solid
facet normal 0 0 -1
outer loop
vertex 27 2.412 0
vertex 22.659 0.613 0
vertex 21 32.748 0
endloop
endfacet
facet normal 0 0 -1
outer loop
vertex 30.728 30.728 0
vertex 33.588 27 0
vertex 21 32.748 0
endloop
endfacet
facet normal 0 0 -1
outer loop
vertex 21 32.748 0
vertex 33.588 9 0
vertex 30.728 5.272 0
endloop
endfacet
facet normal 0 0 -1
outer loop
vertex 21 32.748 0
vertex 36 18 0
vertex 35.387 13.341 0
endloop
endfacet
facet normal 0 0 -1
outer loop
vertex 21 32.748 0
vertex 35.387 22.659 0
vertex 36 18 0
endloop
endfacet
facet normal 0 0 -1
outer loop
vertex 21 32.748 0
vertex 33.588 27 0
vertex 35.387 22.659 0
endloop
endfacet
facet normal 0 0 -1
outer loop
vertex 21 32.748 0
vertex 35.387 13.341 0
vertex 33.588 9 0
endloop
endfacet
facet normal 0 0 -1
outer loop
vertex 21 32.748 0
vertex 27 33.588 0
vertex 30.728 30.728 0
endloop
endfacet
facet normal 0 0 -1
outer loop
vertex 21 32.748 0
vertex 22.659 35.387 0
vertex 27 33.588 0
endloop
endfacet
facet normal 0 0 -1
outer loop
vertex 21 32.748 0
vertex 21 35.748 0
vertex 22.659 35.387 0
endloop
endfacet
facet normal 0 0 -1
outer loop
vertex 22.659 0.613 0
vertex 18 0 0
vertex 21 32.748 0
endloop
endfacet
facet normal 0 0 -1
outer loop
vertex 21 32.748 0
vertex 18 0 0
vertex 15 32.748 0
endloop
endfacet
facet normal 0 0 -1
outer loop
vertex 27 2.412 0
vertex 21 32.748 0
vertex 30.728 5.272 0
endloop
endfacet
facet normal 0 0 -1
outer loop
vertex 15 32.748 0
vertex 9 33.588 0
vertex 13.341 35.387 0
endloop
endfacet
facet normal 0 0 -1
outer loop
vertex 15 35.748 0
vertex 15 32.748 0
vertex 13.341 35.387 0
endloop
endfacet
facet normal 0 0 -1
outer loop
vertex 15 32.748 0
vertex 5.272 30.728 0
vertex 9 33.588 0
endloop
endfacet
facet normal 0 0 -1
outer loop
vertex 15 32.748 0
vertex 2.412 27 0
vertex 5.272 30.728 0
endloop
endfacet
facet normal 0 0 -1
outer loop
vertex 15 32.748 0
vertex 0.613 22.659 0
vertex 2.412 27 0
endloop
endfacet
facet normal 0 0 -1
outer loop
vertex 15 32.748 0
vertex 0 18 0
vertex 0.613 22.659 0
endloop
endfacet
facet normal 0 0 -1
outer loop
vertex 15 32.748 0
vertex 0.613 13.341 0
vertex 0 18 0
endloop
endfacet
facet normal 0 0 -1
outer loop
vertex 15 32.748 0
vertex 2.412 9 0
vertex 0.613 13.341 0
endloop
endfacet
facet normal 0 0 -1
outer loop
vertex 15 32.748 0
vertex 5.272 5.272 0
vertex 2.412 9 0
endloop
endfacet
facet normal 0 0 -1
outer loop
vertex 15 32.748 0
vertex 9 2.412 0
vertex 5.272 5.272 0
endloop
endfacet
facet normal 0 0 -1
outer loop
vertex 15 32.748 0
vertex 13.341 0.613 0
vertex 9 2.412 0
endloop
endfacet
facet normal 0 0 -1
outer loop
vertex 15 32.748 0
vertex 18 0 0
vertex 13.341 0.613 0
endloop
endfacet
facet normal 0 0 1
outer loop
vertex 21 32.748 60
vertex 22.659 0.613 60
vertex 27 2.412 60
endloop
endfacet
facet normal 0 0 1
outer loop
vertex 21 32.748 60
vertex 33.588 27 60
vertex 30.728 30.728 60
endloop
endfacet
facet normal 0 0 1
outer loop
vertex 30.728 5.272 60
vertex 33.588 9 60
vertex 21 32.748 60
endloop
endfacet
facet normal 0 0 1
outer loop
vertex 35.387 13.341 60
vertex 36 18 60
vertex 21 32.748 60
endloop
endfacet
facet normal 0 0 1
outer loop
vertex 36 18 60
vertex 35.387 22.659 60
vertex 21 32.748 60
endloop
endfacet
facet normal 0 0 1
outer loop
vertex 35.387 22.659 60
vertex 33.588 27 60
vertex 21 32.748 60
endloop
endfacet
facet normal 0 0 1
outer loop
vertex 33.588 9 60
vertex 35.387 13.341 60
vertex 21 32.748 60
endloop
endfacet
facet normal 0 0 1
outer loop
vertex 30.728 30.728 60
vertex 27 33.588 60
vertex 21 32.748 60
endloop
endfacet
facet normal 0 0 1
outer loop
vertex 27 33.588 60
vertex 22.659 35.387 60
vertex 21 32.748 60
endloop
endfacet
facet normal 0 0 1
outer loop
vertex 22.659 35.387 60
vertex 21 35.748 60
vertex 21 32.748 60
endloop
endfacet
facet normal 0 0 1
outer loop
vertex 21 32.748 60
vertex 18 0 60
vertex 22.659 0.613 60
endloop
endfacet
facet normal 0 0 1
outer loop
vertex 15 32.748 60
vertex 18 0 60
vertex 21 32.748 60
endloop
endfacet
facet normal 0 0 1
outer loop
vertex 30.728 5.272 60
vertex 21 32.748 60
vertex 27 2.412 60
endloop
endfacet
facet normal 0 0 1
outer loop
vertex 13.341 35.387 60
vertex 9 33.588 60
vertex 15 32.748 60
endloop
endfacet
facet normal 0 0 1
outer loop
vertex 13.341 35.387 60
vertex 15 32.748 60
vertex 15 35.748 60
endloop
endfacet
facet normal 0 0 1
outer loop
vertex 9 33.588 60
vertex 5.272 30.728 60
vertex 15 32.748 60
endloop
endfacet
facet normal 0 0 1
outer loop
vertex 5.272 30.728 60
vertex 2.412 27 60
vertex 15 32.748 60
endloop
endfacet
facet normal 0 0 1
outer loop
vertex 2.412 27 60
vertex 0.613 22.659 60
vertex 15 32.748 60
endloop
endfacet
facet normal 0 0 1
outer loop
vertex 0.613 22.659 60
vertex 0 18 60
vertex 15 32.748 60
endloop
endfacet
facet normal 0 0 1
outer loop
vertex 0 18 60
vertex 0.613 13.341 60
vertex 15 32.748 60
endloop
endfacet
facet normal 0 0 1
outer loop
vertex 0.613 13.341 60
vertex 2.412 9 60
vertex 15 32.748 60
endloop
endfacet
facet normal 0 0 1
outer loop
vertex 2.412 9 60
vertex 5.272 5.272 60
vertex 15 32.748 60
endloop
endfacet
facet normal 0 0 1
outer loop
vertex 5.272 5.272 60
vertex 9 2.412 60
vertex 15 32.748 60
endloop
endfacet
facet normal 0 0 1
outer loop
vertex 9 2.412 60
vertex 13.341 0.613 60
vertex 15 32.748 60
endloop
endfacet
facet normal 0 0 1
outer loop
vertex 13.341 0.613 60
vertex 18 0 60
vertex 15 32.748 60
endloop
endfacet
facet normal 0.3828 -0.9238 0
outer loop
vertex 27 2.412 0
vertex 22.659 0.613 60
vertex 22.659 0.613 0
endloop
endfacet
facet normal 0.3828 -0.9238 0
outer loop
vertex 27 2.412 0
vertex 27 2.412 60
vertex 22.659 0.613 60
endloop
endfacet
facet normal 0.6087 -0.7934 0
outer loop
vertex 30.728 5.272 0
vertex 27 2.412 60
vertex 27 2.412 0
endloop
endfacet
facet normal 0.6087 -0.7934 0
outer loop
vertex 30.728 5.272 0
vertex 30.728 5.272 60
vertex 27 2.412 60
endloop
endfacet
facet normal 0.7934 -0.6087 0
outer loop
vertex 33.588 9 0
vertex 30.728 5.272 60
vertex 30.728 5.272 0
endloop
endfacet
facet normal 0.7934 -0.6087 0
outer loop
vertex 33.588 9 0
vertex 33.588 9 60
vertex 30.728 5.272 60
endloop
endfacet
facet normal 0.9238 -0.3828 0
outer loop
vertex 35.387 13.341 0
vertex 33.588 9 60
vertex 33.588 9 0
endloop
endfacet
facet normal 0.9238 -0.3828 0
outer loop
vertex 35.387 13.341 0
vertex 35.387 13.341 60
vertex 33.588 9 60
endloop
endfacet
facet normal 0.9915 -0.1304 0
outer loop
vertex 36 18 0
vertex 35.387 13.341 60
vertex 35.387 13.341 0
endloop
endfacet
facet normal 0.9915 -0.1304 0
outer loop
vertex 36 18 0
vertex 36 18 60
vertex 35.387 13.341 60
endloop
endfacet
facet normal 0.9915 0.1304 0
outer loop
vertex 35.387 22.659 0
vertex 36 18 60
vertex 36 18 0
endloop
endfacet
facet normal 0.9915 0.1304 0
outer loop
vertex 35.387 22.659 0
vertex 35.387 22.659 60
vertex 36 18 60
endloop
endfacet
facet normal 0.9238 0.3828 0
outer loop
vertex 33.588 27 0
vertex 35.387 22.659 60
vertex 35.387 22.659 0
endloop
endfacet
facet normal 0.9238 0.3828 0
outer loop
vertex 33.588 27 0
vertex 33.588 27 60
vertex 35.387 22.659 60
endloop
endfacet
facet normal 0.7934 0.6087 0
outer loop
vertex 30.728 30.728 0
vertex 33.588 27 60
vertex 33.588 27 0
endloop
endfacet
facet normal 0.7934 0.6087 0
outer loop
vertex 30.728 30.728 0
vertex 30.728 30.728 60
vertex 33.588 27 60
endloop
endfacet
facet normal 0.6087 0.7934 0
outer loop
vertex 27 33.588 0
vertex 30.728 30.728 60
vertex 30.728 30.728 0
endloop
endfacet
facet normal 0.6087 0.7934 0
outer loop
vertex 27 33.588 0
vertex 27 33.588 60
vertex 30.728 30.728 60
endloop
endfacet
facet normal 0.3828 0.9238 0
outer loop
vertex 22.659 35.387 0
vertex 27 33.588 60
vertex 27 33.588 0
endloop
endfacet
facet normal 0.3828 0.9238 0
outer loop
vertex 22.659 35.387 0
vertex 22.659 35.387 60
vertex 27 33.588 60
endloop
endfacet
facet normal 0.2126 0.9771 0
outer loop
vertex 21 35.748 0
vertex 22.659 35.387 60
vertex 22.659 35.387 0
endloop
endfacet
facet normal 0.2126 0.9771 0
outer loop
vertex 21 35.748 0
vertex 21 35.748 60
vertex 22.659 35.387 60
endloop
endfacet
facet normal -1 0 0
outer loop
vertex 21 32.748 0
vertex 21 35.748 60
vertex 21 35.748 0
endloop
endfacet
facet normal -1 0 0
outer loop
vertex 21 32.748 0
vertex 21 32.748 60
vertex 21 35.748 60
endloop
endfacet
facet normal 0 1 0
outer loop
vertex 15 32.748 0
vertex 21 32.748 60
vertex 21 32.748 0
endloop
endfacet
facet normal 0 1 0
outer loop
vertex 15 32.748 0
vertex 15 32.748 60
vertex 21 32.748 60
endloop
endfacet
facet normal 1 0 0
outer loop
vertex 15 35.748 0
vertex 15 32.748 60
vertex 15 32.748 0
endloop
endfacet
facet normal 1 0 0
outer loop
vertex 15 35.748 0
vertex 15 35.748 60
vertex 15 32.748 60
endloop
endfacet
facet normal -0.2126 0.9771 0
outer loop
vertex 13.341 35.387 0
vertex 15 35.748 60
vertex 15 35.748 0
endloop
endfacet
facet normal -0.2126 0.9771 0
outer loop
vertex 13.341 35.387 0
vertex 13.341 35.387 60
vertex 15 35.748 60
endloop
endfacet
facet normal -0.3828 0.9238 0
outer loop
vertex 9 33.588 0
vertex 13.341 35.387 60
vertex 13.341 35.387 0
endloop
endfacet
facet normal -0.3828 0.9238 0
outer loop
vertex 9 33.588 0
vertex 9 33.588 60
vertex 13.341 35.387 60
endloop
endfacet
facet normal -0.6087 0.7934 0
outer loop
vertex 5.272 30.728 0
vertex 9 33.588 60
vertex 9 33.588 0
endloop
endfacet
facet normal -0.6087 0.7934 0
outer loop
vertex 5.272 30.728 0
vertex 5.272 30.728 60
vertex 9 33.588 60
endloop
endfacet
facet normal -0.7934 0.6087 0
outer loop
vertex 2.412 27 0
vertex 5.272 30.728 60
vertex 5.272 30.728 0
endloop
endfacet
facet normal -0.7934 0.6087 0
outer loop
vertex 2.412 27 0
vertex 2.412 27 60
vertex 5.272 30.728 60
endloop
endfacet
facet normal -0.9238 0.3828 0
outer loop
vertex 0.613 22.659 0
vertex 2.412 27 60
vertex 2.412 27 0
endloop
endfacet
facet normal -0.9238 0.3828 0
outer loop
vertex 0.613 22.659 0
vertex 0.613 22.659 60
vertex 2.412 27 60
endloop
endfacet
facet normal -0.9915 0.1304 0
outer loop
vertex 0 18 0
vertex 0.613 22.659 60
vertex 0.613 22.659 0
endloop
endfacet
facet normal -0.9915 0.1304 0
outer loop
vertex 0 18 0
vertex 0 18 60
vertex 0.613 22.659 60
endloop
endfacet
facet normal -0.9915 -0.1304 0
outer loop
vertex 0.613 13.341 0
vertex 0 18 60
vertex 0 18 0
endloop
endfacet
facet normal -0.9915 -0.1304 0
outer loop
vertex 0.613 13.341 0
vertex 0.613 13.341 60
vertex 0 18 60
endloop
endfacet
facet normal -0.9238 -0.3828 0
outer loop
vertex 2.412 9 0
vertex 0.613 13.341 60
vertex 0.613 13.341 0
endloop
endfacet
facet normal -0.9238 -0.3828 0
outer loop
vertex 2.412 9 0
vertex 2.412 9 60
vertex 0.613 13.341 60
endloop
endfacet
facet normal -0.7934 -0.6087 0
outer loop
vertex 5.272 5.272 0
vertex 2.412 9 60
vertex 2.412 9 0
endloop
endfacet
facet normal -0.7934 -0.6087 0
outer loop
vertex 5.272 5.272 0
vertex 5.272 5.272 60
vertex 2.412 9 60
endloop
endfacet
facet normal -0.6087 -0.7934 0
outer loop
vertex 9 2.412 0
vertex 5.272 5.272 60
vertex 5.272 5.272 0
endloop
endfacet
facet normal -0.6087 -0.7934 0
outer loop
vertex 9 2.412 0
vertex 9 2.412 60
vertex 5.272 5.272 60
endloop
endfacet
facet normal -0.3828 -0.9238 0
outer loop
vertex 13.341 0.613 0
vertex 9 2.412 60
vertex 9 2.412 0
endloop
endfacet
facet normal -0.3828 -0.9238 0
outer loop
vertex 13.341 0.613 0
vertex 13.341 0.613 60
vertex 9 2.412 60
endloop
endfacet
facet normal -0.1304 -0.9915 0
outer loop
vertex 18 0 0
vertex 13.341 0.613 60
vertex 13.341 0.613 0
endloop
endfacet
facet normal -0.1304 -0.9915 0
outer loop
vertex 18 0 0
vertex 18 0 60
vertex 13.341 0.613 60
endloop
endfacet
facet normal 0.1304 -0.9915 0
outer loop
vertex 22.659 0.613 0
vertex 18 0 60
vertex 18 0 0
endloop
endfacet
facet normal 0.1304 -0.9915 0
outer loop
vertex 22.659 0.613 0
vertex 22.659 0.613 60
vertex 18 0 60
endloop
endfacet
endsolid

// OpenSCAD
$fn = 32;

// ----------------------------------------------------------------------
// Keyway shaft: d36 shaft, key 6 x 3 mm
// ----------------------------------------------------------------------

// --- parameters (mm) ---
shaft_r = 18;             // shaft radius
key_w = 6;                // keyway width
key_d = 3;                // keyway depth below the surface line
plate_t = 60;             // shaft length, Z (extrusion height)

shaft_d = 2 * shaft_r;  // shaft diameter
circle_step = 15;  // polygon sampling step, degrees

profile = [[13.341, 35.387], [9, 33.588], [5.272, 30.728], [2.412, 27], [0.613, 22.659], [0, 18], [0.613, 13.341], [2.412, 9], [5.272, 5.272], [9, 2.412], [13.341, 0.613], [18, 0], [22.659, 0.613], [27, 2.412], [30.728, 5.272], [33.588, 9], [35.387, 13.341], [36, 18], [35.387, 22.659], [33.588, 27], [30.728, 30.728], [27, 33.588], [22.659, 35.387], [21, 35.748], [21, 32.748], [15, 32.748], [15, 35.748]];  // primary outline, 27 points, counter clockwise

// --- the one profile operation ---
linear_extrude(height = plate_t) polygon(points = profile);
